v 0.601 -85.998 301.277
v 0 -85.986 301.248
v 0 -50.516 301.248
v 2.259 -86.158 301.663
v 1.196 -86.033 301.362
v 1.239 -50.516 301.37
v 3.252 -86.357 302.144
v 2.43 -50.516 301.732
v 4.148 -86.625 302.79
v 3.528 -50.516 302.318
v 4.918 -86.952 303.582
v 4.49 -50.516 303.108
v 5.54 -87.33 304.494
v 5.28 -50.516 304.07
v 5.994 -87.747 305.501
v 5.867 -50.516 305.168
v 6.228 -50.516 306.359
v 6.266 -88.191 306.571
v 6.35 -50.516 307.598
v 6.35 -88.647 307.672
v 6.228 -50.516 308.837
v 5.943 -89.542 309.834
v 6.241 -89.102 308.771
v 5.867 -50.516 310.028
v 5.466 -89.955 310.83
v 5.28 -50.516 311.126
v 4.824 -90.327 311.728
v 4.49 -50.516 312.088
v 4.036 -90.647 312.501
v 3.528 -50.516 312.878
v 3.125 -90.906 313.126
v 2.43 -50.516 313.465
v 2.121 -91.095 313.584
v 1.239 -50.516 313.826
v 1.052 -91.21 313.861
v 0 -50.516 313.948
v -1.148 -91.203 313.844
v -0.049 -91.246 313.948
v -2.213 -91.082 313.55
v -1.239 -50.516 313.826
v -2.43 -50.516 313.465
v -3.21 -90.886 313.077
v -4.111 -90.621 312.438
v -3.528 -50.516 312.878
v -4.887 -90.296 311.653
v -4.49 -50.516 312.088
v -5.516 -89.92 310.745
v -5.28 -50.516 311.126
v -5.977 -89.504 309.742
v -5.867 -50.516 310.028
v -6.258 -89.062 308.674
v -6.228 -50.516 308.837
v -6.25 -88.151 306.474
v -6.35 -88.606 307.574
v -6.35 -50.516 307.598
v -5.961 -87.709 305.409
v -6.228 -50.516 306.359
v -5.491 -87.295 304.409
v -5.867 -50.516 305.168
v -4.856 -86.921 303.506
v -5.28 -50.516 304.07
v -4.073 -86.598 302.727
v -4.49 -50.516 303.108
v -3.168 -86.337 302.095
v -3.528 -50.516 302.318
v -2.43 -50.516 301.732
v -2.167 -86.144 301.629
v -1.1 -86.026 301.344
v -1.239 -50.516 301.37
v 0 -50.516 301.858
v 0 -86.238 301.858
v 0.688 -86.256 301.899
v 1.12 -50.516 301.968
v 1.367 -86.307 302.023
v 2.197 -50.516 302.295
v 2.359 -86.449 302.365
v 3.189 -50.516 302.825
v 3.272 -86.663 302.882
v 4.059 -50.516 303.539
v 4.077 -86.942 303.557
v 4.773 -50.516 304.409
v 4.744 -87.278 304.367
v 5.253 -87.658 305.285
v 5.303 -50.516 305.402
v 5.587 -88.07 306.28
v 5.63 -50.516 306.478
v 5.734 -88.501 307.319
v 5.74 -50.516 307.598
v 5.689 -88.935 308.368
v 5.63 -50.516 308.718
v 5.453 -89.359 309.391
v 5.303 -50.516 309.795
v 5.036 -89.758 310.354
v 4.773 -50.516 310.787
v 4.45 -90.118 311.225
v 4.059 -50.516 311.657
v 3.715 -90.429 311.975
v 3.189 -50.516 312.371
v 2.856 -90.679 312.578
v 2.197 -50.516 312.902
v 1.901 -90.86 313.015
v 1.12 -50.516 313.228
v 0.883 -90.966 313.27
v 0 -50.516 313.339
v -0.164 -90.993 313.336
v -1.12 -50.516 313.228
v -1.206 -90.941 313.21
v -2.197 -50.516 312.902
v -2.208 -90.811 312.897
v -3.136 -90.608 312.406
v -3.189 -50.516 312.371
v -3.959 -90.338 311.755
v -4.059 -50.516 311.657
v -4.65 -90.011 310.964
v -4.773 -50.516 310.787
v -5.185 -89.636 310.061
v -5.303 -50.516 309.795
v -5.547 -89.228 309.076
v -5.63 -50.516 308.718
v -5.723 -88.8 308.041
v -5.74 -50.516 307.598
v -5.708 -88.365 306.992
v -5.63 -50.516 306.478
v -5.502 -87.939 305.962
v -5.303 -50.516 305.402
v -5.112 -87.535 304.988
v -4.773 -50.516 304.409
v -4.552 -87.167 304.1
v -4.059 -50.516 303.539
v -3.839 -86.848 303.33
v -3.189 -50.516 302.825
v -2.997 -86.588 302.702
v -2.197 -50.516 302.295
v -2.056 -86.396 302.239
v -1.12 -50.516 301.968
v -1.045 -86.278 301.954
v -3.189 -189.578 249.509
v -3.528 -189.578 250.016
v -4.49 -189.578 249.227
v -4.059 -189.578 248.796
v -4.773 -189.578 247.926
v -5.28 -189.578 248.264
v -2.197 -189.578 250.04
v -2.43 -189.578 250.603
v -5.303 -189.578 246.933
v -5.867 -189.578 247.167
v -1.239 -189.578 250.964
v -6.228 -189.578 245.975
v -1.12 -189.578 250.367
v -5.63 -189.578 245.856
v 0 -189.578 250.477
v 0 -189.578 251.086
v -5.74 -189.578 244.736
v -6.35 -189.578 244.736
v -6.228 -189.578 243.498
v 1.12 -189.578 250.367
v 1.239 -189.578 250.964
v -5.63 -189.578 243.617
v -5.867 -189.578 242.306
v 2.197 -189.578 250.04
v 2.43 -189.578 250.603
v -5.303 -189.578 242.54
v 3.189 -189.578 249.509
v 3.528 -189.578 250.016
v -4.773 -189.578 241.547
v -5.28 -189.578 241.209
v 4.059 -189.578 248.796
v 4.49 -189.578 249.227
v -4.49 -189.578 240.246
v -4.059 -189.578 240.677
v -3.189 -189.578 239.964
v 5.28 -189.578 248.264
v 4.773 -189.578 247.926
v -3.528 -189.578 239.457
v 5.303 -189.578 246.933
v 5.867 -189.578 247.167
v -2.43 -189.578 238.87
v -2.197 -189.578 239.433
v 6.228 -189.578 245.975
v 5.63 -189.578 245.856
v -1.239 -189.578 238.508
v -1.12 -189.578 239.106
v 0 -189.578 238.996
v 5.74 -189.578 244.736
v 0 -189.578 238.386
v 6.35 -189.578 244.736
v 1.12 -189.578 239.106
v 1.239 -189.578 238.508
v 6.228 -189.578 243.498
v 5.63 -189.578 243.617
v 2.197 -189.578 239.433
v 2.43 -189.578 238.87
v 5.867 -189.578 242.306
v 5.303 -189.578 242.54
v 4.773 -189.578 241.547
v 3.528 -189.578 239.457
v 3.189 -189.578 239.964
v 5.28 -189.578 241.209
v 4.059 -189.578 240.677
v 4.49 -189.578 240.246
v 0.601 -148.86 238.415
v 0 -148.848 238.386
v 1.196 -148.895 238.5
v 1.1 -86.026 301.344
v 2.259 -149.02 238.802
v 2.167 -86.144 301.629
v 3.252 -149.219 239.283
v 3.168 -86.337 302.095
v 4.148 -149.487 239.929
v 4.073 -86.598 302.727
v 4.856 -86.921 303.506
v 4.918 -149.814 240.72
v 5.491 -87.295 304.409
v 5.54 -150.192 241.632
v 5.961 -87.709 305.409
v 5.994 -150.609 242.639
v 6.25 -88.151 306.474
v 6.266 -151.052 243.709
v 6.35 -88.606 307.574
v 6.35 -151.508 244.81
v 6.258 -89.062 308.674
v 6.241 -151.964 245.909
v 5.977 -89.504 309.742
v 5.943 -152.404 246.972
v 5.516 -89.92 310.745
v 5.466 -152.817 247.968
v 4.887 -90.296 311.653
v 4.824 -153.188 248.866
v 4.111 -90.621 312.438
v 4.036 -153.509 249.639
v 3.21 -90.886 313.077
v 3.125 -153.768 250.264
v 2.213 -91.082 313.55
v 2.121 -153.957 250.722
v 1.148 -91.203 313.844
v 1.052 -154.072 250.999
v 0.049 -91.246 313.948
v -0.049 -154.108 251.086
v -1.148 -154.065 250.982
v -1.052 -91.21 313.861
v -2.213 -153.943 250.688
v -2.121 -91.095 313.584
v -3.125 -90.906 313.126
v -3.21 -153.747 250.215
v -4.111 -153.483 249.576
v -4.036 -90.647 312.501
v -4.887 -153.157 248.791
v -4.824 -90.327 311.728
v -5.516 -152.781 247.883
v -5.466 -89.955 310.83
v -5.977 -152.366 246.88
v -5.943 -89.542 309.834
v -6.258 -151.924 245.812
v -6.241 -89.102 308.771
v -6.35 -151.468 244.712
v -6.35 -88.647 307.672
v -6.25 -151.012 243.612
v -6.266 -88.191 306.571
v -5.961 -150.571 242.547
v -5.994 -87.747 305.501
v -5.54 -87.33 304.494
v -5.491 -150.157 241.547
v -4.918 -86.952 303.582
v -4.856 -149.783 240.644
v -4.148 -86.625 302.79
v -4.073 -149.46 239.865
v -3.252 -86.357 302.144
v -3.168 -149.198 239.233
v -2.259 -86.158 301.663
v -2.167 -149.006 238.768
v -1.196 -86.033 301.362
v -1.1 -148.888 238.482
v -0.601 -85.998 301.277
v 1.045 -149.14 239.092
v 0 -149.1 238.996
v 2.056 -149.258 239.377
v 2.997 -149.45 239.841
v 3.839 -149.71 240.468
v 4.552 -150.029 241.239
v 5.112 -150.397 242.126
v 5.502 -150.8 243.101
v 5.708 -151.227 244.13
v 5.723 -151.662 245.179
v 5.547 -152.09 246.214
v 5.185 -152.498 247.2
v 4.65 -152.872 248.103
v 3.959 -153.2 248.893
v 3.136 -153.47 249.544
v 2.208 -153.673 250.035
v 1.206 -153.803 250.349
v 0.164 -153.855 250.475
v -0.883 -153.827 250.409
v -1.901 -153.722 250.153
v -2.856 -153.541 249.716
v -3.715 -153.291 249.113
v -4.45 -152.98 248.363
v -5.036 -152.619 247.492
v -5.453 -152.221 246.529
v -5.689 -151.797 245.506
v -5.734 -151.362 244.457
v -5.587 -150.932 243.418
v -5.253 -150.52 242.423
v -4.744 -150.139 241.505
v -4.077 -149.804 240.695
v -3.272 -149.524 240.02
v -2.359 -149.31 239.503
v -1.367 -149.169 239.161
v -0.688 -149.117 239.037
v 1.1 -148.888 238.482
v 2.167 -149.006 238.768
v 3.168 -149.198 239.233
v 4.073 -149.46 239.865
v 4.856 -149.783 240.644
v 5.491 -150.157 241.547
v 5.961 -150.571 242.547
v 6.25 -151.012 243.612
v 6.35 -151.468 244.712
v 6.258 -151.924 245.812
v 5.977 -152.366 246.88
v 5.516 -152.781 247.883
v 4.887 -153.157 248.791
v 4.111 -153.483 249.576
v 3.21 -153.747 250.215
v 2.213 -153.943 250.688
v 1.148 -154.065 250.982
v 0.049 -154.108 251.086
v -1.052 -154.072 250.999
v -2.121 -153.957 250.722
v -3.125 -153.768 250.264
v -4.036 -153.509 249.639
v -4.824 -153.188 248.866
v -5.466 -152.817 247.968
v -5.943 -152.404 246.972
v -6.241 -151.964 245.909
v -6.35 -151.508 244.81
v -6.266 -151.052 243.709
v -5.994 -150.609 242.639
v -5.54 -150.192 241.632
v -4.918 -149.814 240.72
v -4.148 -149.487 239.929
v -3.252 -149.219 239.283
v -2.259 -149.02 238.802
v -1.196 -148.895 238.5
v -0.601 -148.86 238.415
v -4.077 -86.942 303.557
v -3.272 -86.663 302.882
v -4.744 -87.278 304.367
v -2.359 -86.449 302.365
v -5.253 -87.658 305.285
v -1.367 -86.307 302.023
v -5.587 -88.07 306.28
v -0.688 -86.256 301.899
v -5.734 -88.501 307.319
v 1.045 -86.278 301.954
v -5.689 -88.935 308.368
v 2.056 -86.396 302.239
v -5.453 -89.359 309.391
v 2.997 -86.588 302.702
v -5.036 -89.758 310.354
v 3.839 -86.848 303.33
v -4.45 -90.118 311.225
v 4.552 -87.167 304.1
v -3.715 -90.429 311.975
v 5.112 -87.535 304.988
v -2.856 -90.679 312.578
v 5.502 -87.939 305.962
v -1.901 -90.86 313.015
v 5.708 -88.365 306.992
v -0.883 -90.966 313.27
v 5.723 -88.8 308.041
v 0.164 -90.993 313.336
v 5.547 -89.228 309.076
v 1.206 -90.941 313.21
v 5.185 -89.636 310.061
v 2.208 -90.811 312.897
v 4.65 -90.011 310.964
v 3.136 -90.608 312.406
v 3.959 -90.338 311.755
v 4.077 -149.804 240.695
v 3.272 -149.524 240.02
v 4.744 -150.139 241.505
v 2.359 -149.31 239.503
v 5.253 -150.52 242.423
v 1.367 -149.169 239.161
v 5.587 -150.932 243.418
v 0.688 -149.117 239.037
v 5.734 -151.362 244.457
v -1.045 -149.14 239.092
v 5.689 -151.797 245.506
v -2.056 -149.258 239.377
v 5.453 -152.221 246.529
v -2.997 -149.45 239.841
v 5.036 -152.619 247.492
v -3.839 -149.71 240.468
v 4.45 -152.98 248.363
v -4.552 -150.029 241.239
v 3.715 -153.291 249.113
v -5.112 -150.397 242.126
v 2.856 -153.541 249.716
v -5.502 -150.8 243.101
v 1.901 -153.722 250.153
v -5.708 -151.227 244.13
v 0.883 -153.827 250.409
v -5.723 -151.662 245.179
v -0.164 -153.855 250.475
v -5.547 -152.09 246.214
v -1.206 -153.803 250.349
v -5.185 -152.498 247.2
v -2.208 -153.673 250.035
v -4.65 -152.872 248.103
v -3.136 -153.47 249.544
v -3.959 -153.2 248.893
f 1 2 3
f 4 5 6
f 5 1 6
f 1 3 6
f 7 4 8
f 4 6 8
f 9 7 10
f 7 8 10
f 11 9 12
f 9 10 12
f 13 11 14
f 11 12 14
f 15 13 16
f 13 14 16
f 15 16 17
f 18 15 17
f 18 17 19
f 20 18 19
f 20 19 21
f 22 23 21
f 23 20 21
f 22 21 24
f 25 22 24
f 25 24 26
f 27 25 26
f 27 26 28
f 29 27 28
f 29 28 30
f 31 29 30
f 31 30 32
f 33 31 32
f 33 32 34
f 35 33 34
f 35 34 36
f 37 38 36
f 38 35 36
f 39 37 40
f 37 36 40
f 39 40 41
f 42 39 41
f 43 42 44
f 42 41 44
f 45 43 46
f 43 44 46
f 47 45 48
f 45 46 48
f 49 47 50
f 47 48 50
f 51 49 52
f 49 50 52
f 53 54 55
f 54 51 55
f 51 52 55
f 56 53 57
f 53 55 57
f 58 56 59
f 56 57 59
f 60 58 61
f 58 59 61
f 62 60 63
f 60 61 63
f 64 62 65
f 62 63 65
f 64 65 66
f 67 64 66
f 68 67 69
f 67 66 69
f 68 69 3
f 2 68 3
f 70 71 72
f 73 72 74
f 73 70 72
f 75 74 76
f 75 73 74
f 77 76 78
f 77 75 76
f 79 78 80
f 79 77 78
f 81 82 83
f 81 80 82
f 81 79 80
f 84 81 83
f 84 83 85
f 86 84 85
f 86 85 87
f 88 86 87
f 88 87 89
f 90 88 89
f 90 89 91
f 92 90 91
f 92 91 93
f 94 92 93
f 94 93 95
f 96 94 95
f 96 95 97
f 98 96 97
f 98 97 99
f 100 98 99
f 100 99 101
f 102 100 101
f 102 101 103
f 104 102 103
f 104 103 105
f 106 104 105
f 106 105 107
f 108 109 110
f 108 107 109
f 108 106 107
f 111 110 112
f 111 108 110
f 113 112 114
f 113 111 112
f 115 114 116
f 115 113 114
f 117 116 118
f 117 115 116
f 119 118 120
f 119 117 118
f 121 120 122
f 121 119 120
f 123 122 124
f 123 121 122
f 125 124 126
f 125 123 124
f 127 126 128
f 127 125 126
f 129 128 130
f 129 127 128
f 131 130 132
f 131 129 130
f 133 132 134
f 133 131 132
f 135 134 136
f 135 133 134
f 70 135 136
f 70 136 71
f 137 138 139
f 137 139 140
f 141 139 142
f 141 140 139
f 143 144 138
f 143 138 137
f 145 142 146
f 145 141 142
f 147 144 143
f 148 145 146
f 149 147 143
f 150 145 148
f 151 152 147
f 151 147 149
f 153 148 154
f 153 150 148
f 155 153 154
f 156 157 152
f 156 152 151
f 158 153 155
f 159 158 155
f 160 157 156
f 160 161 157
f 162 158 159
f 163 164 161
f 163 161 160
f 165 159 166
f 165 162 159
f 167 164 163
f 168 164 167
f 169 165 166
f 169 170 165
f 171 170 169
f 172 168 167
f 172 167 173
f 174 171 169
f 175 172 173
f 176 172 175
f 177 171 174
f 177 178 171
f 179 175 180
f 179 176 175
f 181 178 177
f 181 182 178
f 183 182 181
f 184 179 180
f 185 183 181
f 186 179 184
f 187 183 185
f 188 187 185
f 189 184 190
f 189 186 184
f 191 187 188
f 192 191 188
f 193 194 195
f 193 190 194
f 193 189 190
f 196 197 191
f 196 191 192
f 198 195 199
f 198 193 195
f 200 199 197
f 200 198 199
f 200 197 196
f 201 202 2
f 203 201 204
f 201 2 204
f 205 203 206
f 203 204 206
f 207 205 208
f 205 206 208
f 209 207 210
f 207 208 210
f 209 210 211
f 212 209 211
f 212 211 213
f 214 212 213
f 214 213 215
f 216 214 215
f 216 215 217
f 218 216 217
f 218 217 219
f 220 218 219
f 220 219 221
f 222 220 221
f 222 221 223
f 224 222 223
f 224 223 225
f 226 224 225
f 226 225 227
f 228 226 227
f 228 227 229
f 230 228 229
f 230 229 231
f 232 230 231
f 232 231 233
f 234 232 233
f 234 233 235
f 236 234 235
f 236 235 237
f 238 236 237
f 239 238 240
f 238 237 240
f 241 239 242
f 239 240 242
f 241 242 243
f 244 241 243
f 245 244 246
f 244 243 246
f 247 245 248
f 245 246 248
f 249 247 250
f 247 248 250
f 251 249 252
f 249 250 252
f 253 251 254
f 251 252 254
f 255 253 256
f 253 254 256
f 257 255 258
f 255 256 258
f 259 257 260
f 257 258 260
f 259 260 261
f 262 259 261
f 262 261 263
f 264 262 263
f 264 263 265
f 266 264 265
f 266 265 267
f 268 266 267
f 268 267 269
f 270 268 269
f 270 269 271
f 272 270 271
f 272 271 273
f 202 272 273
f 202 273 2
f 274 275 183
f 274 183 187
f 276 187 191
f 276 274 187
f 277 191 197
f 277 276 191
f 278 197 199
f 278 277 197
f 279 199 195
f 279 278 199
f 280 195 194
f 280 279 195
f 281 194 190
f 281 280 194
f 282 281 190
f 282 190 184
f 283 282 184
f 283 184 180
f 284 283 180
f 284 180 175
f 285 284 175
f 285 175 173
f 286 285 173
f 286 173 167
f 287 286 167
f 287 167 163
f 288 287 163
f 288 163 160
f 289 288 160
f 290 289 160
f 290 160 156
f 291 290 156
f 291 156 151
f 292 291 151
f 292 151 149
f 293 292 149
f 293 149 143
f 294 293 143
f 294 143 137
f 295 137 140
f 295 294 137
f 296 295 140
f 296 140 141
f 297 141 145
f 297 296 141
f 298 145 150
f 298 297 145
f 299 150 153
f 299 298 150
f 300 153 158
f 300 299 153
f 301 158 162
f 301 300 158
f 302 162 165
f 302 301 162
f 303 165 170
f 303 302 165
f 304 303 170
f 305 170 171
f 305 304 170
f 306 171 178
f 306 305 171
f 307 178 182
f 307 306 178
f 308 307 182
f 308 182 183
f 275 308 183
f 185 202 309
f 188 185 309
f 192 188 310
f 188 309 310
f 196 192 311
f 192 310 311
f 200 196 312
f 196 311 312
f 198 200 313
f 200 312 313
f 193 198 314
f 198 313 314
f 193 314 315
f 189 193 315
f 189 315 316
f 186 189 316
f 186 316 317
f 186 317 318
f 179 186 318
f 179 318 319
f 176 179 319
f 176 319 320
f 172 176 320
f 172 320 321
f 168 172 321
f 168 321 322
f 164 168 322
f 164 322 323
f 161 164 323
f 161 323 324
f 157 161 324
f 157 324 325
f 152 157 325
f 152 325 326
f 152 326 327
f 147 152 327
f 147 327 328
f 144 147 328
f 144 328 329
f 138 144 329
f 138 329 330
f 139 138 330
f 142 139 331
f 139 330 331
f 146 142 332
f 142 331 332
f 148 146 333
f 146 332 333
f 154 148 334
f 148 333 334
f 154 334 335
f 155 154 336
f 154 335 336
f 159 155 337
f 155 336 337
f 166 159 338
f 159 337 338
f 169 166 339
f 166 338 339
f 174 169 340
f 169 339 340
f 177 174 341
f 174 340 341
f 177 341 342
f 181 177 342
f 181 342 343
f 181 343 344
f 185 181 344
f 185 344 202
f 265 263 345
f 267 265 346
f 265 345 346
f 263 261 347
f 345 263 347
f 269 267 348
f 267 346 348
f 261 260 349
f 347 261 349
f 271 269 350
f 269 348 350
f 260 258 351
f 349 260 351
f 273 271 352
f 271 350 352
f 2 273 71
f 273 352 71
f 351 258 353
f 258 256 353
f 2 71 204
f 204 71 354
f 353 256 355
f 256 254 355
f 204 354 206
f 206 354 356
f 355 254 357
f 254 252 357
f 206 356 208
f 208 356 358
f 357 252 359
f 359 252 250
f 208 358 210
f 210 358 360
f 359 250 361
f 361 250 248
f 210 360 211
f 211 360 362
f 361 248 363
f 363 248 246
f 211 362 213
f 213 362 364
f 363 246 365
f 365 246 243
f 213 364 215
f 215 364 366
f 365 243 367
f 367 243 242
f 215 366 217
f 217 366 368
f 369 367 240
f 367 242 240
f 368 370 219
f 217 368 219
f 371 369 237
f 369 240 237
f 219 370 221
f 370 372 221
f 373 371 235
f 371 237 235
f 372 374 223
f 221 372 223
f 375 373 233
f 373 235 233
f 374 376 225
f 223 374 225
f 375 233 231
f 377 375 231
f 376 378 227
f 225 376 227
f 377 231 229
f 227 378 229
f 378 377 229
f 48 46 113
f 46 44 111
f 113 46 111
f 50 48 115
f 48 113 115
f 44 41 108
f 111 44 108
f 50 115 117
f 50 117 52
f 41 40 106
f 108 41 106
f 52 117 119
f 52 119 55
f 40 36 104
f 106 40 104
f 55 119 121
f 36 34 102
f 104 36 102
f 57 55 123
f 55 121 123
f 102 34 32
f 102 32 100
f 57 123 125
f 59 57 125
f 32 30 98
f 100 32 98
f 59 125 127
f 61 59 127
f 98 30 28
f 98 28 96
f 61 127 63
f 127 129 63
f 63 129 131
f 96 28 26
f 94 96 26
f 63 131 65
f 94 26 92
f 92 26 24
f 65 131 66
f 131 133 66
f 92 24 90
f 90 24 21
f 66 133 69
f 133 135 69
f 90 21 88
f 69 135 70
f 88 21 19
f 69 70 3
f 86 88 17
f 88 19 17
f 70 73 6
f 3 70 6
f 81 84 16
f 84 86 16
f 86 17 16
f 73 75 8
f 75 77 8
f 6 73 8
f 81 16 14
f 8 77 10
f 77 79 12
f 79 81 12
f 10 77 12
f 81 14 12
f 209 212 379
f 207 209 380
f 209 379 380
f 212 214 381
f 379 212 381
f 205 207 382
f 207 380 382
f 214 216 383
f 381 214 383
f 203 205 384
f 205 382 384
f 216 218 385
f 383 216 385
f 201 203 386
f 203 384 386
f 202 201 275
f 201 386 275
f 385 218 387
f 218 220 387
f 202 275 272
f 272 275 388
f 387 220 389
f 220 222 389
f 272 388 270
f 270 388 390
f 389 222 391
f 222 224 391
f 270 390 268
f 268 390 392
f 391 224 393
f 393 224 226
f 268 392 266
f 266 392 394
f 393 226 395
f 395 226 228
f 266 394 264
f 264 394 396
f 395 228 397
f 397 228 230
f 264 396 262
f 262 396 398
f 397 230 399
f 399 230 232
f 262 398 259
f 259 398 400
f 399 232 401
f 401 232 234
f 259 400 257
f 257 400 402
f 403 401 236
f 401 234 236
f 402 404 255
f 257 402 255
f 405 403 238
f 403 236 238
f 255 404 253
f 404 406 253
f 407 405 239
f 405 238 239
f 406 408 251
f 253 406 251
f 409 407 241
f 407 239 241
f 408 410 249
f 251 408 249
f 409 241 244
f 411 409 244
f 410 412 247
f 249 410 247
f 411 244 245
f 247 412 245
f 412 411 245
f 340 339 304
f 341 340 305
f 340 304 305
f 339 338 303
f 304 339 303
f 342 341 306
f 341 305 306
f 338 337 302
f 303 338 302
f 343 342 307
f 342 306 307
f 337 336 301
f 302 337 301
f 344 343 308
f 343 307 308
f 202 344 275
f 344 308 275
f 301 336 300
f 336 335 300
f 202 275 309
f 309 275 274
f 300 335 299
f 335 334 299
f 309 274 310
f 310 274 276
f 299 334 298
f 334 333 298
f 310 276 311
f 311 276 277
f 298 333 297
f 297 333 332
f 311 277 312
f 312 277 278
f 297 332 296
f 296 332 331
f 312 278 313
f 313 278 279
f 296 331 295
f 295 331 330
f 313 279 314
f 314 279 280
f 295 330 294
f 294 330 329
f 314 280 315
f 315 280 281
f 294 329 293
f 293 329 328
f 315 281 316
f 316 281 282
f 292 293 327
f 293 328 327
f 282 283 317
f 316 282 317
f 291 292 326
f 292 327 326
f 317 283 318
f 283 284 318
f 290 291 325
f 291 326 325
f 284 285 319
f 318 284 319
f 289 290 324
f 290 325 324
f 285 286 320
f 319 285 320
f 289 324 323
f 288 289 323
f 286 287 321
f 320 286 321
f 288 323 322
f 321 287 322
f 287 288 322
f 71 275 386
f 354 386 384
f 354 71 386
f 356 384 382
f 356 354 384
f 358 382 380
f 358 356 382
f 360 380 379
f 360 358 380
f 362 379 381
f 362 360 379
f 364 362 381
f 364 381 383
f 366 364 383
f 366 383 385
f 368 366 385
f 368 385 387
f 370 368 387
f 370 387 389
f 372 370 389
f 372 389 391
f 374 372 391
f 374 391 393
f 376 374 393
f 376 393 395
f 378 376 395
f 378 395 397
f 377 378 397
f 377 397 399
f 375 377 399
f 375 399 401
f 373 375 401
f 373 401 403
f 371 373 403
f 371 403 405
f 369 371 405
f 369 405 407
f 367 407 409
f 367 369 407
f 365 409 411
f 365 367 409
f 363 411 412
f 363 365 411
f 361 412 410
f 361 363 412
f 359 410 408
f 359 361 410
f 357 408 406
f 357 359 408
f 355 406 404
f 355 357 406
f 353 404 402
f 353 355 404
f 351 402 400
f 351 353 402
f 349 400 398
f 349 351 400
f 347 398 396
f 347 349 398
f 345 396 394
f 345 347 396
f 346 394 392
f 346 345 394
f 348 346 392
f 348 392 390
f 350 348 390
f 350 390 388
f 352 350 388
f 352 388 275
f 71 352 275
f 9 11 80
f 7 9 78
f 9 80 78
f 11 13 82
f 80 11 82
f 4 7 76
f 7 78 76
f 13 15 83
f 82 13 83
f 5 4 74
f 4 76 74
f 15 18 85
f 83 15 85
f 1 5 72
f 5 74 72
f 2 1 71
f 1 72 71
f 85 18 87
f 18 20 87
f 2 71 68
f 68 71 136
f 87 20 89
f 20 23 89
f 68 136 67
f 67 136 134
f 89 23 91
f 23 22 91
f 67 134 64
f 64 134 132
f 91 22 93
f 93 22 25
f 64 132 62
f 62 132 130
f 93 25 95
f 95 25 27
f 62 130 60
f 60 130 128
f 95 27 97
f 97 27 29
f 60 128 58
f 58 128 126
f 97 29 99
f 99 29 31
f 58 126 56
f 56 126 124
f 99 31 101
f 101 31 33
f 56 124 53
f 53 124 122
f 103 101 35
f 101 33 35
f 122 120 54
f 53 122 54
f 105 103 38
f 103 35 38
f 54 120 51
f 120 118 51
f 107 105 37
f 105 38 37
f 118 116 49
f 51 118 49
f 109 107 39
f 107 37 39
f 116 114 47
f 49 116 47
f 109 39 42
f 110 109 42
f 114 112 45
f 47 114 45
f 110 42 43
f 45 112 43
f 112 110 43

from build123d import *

# Parameters (mm, degrees)
SKETCH11_R                = 6.35
SKETCH11_R_2              = 5.7404
PIPE_0_5_SCH_40_1_DEPTH   = 42.819743879
SKETCH11_ON_SEGMENT_2_R   = 6.35
SKETCH11_ON_SEGMENT_2_R_2 = 5.7404
PIPE_0_5_SCH_40_1_2_DEPTH = 98.339487758
SKETCH11_ON_SEGMENT_3_R   = 6.35
SKETCH11_ON_SEGMENT_3_R_2 = 5.7404
PIPE_0_5_SCH_40_1_3_DEPTH = 42.819743879


with BuildPart() as part:
    # Sketch11 → Pipe 0.5 SCH 40(1) (new body)
    with BuildSketch(Plane(origin=(0, -50.516236303, 307.598264834), x_dir=(0, 0, -1), z_dir=(0, -1, 0))):
        Circle(SKETCH11_R)
        Circle(SKETCH11_R_2, mode=Mode.SUBTRACT)
    extrude(amount=PIPE_0_5_SCH_40_1_DEPTH)

    # Pipe 0.5 SCH 40(1) mitre 1
    split(bisect_by=Plane(origin=(0, -88.616236303, 307.598264834), x_dir=(-1, 0, 0), z_dir=(0, 0.923879533, 0.382683432)), keep=Keep.TOP)


with BuildPart() as body_2:
    # Sketch11 on segment 2 (carried to segment 2) → Pipe 0.5 SCH 40_1 2 (new body)
    with BuildSketch(Plane(origin=(0, -85.278873401, 310.935627736), x_dir=(0, 0.707106781, -0.707106781), z_dir=(0, -0.707106781, -0.707106781))):
        Circle(SKETCH11_ON_SEGMENT_2_R)
        Circle(SKETCH11_ON_SEGMENT_2_R_2, mode=Mode.SUBTRACT)
    extrude(amount=PIPE_0_5_SCH_40_1_2_DEPTH)

    # Pipe 0.5 SCH 40_1 2 mitre 1
    split(bisect_by=Plane(origin=(0, -88.616236303, 307.598264834), x_dir=(1, 0, 0), z_dir=(0, -0.923879533, -0.382683432)), keep=Keep.TOP)

    # Pipe 0.5 SCH 40_1 2 mitre 2
    split(bisect_by=Plane(origin=(0, -151.47802915, 244.736471986), x_dir=(-1, 0, 0), z_dir=(0, 0.923879533, 0.382683432)), keep=Keep.TOP)


with BuildPart() as body_3:
    # Sketch11 on segment 3 (carried to segment 3) → Pipe 0.5 SCH 40_1 3 (new body)
    with BuildSketch(Plane(origin=(0, -146.758285271, 244.736471986), x_dir=(0, 0, -1), z_dir=(0, -1, 0))):
        Circle(SKETCH11_ON_SEGMENT_3_R)
        Circle(SKETCH11_ON_SEGMENT_3_R_2, mode=Mode.SUBTRACT)
    extrude(amount=PIPE_0_5_SCH_40_1_3_DEPTH)

    # Pipe 0.5 SCH 40_1 3 mitre 1
    split(bisect_by=Plane(origin=(0, -151.47802915, 244.736471986), x_dir=(1, 0, 0), z_dir=(0, -0.923879533, -0.382683432)), keep=Keep.TOP)


solid = Compound([part.part, body_2.part, body_3.part])
